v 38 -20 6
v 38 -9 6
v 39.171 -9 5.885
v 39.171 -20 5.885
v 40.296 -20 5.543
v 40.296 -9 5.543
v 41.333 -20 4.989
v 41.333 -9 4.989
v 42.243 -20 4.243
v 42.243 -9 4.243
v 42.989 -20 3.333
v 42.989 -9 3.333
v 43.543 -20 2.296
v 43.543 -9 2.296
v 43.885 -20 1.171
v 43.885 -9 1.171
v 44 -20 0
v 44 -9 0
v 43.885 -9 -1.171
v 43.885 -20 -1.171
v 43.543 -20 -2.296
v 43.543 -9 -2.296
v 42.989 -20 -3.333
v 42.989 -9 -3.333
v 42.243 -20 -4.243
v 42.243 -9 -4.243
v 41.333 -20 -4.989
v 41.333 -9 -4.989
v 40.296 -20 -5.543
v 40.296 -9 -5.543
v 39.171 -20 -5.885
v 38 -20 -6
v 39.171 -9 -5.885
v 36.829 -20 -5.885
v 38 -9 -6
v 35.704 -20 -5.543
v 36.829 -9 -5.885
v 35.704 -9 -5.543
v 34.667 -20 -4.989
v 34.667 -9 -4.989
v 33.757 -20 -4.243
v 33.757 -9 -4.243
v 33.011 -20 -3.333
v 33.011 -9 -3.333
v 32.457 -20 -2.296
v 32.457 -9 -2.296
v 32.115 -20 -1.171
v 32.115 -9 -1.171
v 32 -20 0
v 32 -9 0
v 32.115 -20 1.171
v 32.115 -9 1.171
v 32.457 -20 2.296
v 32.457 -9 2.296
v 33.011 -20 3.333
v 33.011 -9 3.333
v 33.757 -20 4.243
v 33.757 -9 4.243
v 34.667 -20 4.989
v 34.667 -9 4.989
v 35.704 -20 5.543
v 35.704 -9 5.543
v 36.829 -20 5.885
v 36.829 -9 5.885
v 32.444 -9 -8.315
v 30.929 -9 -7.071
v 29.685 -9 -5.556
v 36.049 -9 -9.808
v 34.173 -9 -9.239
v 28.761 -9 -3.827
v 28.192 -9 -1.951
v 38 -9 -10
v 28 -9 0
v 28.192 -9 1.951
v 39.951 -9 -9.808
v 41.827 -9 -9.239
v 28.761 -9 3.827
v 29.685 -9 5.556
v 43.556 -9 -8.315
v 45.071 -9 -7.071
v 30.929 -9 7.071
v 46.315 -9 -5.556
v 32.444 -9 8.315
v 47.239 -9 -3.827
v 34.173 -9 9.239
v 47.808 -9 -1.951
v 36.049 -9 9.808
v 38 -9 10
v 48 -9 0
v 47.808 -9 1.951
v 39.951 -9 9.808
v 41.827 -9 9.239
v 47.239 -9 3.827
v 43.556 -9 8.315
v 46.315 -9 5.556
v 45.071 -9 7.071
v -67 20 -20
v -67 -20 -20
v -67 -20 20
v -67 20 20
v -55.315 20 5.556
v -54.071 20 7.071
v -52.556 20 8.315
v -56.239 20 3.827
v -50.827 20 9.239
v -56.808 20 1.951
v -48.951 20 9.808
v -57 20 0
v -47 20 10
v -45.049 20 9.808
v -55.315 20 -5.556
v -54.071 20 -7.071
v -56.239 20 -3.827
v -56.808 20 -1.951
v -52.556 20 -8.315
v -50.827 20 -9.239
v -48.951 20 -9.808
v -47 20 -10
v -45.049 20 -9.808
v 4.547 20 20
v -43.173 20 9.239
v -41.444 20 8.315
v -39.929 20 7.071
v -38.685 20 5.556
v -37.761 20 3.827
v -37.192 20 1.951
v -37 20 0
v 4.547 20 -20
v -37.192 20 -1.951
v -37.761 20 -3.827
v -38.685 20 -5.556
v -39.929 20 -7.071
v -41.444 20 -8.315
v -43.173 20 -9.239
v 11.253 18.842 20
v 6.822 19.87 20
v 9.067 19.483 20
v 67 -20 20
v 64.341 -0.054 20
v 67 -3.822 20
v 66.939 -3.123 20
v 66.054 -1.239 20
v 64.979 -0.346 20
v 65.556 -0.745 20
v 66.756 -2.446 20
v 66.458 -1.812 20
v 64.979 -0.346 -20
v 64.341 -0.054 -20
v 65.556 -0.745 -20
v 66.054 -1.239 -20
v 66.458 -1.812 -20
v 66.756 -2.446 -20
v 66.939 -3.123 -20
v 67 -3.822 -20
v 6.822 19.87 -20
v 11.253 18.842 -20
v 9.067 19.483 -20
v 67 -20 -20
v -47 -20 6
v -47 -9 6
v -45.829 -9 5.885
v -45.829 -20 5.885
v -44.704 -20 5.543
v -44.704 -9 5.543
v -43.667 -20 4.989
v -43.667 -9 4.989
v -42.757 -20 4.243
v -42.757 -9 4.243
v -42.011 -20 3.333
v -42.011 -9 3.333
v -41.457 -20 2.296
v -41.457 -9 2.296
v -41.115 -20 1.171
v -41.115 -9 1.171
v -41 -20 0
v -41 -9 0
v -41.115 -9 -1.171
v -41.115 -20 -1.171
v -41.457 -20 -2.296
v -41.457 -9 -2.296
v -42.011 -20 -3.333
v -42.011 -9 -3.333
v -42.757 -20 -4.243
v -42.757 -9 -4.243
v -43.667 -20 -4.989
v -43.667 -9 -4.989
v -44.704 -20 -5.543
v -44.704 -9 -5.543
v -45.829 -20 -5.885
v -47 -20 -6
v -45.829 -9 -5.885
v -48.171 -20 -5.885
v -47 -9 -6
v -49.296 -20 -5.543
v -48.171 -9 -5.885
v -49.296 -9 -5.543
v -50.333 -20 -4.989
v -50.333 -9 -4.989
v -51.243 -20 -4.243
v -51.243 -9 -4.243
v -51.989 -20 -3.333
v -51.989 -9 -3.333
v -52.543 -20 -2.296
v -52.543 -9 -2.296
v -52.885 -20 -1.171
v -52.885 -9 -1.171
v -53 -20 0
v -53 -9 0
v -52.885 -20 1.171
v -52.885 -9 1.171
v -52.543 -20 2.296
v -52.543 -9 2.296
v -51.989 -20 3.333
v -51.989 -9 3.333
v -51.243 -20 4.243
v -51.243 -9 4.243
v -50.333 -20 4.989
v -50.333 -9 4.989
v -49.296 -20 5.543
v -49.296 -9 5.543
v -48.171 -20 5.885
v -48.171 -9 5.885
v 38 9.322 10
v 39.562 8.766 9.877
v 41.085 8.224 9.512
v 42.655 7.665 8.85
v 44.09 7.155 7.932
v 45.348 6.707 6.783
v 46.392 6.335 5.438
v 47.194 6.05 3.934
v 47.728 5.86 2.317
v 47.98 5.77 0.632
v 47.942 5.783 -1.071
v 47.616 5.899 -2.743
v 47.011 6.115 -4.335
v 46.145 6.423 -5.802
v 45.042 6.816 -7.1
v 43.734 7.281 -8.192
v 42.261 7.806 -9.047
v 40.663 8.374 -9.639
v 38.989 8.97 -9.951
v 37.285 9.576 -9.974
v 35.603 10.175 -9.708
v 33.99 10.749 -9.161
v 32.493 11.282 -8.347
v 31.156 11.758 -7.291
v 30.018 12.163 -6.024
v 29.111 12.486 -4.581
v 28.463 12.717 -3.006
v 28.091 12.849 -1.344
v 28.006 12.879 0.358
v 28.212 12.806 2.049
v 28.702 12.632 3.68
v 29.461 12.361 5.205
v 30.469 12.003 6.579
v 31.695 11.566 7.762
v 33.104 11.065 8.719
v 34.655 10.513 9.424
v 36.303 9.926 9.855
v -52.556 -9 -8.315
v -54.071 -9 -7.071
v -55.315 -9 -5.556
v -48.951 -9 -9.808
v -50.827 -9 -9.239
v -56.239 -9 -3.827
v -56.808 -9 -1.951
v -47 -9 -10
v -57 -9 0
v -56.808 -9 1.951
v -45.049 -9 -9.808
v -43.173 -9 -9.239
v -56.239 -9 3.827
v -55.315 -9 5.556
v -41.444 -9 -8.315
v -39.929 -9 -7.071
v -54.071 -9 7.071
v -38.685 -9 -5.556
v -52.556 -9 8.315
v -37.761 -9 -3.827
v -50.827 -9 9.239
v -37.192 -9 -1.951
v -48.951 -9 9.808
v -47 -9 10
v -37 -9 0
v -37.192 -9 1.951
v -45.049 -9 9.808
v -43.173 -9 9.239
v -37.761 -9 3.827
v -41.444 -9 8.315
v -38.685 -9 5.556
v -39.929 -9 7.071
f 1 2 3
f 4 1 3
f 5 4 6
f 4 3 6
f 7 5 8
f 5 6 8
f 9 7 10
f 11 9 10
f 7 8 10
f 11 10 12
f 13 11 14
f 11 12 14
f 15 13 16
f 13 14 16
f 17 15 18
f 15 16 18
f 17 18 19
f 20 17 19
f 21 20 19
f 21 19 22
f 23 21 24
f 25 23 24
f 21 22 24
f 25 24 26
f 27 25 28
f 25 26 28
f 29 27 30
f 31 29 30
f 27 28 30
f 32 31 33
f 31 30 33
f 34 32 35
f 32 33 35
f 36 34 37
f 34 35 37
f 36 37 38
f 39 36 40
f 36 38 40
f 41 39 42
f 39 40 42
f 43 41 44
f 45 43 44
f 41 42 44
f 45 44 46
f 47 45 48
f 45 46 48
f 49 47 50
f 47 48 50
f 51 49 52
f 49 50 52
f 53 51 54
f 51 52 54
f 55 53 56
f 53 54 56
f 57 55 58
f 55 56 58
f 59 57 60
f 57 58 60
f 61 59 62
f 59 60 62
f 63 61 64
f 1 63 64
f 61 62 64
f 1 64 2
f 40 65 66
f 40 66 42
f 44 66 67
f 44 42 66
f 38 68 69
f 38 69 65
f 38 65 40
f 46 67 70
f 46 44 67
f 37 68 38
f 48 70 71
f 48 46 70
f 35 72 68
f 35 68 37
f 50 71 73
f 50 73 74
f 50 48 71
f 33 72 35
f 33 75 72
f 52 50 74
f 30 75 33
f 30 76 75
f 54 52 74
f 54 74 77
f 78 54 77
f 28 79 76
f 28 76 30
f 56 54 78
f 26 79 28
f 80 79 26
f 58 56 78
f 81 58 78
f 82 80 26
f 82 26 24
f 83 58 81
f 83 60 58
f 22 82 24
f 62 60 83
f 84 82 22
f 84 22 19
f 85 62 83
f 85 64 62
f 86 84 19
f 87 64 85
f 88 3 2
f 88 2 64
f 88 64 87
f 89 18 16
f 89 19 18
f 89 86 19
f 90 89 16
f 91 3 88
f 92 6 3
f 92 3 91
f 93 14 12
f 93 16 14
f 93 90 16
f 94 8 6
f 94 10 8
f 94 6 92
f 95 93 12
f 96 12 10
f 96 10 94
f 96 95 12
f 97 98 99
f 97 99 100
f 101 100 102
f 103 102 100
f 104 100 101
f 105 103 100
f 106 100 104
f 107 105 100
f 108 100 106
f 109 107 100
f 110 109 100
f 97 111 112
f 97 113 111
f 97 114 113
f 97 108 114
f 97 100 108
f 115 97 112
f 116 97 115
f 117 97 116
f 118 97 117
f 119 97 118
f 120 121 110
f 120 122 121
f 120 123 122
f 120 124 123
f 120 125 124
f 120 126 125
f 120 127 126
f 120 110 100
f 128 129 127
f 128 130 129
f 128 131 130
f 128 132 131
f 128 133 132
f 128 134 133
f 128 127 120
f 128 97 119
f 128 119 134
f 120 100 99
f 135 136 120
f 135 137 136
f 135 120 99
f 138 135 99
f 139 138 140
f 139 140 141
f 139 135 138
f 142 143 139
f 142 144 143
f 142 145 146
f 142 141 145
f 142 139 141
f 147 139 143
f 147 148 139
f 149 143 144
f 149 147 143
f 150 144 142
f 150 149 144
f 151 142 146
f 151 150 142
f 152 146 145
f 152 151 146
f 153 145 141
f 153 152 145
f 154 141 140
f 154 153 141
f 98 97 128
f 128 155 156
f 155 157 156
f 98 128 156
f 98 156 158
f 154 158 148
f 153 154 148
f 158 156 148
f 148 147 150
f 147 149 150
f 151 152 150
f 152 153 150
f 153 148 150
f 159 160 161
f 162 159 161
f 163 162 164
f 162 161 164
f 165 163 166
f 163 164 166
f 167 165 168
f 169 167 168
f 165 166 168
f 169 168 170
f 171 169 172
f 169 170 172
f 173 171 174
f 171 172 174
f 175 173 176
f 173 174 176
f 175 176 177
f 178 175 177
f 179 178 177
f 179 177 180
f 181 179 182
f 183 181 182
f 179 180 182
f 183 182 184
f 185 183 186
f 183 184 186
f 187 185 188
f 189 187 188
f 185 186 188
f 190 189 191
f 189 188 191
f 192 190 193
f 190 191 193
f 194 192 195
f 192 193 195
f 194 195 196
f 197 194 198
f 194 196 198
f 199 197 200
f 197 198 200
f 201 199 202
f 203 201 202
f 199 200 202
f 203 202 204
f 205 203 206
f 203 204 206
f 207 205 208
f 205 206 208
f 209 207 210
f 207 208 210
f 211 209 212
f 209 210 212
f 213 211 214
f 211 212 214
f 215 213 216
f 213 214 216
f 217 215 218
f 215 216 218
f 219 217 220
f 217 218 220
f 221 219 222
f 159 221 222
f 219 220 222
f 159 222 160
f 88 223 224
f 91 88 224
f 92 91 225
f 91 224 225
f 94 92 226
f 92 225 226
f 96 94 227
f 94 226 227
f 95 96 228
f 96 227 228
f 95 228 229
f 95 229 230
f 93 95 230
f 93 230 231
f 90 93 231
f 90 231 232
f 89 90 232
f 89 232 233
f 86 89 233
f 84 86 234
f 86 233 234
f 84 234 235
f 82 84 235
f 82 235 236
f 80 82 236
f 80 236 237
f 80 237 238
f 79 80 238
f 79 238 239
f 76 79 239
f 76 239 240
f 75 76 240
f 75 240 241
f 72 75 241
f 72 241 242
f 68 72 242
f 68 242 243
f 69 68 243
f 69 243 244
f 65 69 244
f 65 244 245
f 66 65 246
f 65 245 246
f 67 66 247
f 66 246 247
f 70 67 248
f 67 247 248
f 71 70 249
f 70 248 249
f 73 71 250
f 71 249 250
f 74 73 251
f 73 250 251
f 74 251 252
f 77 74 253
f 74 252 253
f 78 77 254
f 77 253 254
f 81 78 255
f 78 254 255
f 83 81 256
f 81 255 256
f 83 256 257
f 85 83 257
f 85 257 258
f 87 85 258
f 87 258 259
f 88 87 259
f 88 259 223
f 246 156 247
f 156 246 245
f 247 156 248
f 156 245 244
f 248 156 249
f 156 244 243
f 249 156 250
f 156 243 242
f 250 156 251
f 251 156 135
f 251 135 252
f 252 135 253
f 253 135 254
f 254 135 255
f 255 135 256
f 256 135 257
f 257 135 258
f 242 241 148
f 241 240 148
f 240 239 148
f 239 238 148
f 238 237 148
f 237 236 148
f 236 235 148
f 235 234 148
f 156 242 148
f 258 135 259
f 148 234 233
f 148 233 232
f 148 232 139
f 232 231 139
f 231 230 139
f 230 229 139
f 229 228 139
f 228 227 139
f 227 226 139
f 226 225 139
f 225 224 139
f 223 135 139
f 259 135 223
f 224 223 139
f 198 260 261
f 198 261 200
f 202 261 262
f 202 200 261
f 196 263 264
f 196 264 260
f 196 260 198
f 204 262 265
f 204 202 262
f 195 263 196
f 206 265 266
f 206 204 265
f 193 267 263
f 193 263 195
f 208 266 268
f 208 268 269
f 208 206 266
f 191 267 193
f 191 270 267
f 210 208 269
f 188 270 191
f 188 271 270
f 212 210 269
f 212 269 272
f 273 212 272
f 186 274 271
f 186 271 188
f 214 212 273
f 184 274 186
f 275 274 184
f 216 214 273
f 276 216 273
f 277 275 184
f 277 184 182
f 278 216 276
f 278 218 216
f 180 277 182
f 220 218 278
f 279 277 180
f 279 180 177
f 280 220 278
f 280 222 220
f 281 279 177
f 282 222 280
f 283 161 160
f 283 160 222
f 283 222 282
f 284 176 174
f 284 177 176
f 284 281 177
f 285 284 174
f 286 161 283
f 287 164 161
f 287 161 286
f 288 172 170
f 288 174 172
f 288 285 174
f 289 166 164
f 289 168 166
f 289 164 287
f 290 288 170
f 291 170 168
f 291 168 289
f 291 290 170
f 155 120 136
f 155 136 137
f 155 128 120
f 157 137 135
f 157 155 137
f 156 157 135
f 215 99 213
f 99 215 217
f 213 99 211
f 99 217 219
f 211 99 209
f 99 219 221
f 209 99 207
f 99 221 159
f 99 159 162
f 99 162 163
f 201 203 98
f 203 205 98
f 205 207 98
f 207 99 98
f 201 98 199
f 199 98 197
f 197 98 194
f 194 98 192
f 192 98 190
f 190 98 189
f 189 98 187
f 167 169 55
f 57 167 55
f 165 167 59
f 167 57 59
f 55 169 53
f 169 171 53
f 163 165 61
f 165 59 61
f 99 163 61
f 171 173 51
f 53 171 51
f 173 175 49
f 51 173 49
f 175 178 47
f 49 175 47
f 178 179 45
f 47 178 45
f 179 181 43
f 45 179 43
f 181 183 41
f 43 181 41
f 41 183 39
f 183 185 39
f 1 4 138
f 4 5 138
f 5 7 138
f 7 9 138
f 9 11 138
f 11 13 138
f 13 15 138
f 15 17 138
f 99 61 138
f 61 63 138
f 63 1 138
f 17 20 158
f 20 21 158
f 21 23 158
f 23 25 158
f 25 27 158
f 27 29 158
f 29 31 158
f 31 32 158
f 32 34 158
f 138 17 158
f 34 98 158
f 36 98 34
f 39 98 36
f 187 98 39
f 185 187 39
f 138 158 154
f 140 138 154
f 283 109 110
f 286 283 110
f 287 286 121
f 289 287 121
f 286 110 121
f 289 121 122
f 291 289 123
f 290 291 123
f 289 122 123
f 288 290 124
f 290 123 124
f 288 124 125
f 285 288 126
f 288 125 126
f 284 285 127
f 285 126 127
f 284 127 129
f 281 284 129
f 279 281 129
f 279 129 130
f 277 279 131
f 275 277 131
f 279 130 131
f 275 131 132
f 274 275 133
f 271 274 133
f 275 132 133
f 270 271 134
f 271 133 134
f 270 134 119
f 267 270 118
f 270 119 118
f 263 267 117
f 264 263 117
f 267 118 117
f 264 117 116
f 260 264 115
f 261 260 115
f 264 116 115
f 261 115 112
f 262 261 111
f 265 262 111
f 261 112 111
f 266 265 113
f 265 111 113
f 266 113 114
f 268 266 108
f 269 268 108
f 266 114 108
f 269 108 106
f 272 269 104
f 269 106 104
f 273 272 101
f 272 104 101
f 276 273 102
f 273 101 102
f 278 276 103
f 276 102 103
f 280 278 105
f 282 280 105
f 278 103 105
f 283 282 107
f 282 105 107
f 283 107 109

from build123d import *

# Parameters (mm, degrees)
BOSS_EXTRUDE1_DEPTH      = 20
BOSS_EXTRUDE1_DEPTH_BACK = 20
SKETCH1_W                = 134
SKETCH1_H                = 40
CUT_EXTRUDE1_DEPTH       = 40
FILLET1_R                = 20
FILLET2_R                = 4
SKETCH3_R                = 10
CUT_EXTRUDE2_DEPTH       = 29
SKETCH4_R                = 6
CUT_EXTRUDE3_DEPTH       = 11


with BuildPart() as part:
    # Sketch1 → Boss-Extrude1 (new, two sides: drawn at the far end of the back side and taken through both)
    with BuildSketch(Plane.XY.offset(-BOSS_EXTRUDE1_DEPTH_BACK)):
        Rectangle(SKETCH1_W, SKETCH1_H)
    extrude(amount=BOSS_EXTRUDE1_DEPTH + BOSS_EXTRUDE1_DEPTH_BACK)

    # Sketch2 → Cut-Extrude1 (cut)
    with BuildSketch(Plane.XY.offset(20)):
        Polygon((8, 20), (67, -1), (67, 20), align=None)
    extrude(amount=-CUT_EXTRUDE1_DEPTH, mode=Mode.SUBTRACT)

    # Fillet1
    fillet1_edges = [part.edges().sort_by_distance(p)[0] for p in [
        (8, 20, 0),
    ]]
    fillet(fillet1_edges, radius=FILLET1_R)

    # Fillet2
    fillet2_edges = [part.edges().sort_by_distance(p)[0] for p in [
        (67, -1, 0),
    ]]
    fillet(fillet2_edges, radius=FILLET2_R)

    # Sketch3 → Cut-Extrude2 (cut)
    with BuildSketch(Plane(origin=(0, 20, 0), x_dir=(1, 0, 0), z_dir=(0, 1, 0))):
        with Locations(Location((-47, 0, 0), (0, 0, 270))):
            Circle(SKETCH3_R)
        with Locations(Location((38, 0, 0), (0, 0, 270))):
            Circle(SKETCH3_R)
    extrude(amount=-CUT_EXTRUDE2_DEPTH, mode=Mode.SUBTRACT)

    # Sketch4 → Cut-Extrude3 (cut)
    with BuildSketch(Plane(origin=(0, -9, 0), x_dir=(1, 0, 0), z_dir=(0, 1, 0))):
        with Locations(Location((-47, 0, 0), (0, 0, 270))):
            Circle(SKETCH4_R)
        with Locations(Location((38, 0, 0), (0, 0, 270))):
            Circle(SKETCH4_R)
    extrude(amount=-CUT_EXTRUDE3_DEPTH, mode=Mode.SUBTRACT)


solid = part.part
